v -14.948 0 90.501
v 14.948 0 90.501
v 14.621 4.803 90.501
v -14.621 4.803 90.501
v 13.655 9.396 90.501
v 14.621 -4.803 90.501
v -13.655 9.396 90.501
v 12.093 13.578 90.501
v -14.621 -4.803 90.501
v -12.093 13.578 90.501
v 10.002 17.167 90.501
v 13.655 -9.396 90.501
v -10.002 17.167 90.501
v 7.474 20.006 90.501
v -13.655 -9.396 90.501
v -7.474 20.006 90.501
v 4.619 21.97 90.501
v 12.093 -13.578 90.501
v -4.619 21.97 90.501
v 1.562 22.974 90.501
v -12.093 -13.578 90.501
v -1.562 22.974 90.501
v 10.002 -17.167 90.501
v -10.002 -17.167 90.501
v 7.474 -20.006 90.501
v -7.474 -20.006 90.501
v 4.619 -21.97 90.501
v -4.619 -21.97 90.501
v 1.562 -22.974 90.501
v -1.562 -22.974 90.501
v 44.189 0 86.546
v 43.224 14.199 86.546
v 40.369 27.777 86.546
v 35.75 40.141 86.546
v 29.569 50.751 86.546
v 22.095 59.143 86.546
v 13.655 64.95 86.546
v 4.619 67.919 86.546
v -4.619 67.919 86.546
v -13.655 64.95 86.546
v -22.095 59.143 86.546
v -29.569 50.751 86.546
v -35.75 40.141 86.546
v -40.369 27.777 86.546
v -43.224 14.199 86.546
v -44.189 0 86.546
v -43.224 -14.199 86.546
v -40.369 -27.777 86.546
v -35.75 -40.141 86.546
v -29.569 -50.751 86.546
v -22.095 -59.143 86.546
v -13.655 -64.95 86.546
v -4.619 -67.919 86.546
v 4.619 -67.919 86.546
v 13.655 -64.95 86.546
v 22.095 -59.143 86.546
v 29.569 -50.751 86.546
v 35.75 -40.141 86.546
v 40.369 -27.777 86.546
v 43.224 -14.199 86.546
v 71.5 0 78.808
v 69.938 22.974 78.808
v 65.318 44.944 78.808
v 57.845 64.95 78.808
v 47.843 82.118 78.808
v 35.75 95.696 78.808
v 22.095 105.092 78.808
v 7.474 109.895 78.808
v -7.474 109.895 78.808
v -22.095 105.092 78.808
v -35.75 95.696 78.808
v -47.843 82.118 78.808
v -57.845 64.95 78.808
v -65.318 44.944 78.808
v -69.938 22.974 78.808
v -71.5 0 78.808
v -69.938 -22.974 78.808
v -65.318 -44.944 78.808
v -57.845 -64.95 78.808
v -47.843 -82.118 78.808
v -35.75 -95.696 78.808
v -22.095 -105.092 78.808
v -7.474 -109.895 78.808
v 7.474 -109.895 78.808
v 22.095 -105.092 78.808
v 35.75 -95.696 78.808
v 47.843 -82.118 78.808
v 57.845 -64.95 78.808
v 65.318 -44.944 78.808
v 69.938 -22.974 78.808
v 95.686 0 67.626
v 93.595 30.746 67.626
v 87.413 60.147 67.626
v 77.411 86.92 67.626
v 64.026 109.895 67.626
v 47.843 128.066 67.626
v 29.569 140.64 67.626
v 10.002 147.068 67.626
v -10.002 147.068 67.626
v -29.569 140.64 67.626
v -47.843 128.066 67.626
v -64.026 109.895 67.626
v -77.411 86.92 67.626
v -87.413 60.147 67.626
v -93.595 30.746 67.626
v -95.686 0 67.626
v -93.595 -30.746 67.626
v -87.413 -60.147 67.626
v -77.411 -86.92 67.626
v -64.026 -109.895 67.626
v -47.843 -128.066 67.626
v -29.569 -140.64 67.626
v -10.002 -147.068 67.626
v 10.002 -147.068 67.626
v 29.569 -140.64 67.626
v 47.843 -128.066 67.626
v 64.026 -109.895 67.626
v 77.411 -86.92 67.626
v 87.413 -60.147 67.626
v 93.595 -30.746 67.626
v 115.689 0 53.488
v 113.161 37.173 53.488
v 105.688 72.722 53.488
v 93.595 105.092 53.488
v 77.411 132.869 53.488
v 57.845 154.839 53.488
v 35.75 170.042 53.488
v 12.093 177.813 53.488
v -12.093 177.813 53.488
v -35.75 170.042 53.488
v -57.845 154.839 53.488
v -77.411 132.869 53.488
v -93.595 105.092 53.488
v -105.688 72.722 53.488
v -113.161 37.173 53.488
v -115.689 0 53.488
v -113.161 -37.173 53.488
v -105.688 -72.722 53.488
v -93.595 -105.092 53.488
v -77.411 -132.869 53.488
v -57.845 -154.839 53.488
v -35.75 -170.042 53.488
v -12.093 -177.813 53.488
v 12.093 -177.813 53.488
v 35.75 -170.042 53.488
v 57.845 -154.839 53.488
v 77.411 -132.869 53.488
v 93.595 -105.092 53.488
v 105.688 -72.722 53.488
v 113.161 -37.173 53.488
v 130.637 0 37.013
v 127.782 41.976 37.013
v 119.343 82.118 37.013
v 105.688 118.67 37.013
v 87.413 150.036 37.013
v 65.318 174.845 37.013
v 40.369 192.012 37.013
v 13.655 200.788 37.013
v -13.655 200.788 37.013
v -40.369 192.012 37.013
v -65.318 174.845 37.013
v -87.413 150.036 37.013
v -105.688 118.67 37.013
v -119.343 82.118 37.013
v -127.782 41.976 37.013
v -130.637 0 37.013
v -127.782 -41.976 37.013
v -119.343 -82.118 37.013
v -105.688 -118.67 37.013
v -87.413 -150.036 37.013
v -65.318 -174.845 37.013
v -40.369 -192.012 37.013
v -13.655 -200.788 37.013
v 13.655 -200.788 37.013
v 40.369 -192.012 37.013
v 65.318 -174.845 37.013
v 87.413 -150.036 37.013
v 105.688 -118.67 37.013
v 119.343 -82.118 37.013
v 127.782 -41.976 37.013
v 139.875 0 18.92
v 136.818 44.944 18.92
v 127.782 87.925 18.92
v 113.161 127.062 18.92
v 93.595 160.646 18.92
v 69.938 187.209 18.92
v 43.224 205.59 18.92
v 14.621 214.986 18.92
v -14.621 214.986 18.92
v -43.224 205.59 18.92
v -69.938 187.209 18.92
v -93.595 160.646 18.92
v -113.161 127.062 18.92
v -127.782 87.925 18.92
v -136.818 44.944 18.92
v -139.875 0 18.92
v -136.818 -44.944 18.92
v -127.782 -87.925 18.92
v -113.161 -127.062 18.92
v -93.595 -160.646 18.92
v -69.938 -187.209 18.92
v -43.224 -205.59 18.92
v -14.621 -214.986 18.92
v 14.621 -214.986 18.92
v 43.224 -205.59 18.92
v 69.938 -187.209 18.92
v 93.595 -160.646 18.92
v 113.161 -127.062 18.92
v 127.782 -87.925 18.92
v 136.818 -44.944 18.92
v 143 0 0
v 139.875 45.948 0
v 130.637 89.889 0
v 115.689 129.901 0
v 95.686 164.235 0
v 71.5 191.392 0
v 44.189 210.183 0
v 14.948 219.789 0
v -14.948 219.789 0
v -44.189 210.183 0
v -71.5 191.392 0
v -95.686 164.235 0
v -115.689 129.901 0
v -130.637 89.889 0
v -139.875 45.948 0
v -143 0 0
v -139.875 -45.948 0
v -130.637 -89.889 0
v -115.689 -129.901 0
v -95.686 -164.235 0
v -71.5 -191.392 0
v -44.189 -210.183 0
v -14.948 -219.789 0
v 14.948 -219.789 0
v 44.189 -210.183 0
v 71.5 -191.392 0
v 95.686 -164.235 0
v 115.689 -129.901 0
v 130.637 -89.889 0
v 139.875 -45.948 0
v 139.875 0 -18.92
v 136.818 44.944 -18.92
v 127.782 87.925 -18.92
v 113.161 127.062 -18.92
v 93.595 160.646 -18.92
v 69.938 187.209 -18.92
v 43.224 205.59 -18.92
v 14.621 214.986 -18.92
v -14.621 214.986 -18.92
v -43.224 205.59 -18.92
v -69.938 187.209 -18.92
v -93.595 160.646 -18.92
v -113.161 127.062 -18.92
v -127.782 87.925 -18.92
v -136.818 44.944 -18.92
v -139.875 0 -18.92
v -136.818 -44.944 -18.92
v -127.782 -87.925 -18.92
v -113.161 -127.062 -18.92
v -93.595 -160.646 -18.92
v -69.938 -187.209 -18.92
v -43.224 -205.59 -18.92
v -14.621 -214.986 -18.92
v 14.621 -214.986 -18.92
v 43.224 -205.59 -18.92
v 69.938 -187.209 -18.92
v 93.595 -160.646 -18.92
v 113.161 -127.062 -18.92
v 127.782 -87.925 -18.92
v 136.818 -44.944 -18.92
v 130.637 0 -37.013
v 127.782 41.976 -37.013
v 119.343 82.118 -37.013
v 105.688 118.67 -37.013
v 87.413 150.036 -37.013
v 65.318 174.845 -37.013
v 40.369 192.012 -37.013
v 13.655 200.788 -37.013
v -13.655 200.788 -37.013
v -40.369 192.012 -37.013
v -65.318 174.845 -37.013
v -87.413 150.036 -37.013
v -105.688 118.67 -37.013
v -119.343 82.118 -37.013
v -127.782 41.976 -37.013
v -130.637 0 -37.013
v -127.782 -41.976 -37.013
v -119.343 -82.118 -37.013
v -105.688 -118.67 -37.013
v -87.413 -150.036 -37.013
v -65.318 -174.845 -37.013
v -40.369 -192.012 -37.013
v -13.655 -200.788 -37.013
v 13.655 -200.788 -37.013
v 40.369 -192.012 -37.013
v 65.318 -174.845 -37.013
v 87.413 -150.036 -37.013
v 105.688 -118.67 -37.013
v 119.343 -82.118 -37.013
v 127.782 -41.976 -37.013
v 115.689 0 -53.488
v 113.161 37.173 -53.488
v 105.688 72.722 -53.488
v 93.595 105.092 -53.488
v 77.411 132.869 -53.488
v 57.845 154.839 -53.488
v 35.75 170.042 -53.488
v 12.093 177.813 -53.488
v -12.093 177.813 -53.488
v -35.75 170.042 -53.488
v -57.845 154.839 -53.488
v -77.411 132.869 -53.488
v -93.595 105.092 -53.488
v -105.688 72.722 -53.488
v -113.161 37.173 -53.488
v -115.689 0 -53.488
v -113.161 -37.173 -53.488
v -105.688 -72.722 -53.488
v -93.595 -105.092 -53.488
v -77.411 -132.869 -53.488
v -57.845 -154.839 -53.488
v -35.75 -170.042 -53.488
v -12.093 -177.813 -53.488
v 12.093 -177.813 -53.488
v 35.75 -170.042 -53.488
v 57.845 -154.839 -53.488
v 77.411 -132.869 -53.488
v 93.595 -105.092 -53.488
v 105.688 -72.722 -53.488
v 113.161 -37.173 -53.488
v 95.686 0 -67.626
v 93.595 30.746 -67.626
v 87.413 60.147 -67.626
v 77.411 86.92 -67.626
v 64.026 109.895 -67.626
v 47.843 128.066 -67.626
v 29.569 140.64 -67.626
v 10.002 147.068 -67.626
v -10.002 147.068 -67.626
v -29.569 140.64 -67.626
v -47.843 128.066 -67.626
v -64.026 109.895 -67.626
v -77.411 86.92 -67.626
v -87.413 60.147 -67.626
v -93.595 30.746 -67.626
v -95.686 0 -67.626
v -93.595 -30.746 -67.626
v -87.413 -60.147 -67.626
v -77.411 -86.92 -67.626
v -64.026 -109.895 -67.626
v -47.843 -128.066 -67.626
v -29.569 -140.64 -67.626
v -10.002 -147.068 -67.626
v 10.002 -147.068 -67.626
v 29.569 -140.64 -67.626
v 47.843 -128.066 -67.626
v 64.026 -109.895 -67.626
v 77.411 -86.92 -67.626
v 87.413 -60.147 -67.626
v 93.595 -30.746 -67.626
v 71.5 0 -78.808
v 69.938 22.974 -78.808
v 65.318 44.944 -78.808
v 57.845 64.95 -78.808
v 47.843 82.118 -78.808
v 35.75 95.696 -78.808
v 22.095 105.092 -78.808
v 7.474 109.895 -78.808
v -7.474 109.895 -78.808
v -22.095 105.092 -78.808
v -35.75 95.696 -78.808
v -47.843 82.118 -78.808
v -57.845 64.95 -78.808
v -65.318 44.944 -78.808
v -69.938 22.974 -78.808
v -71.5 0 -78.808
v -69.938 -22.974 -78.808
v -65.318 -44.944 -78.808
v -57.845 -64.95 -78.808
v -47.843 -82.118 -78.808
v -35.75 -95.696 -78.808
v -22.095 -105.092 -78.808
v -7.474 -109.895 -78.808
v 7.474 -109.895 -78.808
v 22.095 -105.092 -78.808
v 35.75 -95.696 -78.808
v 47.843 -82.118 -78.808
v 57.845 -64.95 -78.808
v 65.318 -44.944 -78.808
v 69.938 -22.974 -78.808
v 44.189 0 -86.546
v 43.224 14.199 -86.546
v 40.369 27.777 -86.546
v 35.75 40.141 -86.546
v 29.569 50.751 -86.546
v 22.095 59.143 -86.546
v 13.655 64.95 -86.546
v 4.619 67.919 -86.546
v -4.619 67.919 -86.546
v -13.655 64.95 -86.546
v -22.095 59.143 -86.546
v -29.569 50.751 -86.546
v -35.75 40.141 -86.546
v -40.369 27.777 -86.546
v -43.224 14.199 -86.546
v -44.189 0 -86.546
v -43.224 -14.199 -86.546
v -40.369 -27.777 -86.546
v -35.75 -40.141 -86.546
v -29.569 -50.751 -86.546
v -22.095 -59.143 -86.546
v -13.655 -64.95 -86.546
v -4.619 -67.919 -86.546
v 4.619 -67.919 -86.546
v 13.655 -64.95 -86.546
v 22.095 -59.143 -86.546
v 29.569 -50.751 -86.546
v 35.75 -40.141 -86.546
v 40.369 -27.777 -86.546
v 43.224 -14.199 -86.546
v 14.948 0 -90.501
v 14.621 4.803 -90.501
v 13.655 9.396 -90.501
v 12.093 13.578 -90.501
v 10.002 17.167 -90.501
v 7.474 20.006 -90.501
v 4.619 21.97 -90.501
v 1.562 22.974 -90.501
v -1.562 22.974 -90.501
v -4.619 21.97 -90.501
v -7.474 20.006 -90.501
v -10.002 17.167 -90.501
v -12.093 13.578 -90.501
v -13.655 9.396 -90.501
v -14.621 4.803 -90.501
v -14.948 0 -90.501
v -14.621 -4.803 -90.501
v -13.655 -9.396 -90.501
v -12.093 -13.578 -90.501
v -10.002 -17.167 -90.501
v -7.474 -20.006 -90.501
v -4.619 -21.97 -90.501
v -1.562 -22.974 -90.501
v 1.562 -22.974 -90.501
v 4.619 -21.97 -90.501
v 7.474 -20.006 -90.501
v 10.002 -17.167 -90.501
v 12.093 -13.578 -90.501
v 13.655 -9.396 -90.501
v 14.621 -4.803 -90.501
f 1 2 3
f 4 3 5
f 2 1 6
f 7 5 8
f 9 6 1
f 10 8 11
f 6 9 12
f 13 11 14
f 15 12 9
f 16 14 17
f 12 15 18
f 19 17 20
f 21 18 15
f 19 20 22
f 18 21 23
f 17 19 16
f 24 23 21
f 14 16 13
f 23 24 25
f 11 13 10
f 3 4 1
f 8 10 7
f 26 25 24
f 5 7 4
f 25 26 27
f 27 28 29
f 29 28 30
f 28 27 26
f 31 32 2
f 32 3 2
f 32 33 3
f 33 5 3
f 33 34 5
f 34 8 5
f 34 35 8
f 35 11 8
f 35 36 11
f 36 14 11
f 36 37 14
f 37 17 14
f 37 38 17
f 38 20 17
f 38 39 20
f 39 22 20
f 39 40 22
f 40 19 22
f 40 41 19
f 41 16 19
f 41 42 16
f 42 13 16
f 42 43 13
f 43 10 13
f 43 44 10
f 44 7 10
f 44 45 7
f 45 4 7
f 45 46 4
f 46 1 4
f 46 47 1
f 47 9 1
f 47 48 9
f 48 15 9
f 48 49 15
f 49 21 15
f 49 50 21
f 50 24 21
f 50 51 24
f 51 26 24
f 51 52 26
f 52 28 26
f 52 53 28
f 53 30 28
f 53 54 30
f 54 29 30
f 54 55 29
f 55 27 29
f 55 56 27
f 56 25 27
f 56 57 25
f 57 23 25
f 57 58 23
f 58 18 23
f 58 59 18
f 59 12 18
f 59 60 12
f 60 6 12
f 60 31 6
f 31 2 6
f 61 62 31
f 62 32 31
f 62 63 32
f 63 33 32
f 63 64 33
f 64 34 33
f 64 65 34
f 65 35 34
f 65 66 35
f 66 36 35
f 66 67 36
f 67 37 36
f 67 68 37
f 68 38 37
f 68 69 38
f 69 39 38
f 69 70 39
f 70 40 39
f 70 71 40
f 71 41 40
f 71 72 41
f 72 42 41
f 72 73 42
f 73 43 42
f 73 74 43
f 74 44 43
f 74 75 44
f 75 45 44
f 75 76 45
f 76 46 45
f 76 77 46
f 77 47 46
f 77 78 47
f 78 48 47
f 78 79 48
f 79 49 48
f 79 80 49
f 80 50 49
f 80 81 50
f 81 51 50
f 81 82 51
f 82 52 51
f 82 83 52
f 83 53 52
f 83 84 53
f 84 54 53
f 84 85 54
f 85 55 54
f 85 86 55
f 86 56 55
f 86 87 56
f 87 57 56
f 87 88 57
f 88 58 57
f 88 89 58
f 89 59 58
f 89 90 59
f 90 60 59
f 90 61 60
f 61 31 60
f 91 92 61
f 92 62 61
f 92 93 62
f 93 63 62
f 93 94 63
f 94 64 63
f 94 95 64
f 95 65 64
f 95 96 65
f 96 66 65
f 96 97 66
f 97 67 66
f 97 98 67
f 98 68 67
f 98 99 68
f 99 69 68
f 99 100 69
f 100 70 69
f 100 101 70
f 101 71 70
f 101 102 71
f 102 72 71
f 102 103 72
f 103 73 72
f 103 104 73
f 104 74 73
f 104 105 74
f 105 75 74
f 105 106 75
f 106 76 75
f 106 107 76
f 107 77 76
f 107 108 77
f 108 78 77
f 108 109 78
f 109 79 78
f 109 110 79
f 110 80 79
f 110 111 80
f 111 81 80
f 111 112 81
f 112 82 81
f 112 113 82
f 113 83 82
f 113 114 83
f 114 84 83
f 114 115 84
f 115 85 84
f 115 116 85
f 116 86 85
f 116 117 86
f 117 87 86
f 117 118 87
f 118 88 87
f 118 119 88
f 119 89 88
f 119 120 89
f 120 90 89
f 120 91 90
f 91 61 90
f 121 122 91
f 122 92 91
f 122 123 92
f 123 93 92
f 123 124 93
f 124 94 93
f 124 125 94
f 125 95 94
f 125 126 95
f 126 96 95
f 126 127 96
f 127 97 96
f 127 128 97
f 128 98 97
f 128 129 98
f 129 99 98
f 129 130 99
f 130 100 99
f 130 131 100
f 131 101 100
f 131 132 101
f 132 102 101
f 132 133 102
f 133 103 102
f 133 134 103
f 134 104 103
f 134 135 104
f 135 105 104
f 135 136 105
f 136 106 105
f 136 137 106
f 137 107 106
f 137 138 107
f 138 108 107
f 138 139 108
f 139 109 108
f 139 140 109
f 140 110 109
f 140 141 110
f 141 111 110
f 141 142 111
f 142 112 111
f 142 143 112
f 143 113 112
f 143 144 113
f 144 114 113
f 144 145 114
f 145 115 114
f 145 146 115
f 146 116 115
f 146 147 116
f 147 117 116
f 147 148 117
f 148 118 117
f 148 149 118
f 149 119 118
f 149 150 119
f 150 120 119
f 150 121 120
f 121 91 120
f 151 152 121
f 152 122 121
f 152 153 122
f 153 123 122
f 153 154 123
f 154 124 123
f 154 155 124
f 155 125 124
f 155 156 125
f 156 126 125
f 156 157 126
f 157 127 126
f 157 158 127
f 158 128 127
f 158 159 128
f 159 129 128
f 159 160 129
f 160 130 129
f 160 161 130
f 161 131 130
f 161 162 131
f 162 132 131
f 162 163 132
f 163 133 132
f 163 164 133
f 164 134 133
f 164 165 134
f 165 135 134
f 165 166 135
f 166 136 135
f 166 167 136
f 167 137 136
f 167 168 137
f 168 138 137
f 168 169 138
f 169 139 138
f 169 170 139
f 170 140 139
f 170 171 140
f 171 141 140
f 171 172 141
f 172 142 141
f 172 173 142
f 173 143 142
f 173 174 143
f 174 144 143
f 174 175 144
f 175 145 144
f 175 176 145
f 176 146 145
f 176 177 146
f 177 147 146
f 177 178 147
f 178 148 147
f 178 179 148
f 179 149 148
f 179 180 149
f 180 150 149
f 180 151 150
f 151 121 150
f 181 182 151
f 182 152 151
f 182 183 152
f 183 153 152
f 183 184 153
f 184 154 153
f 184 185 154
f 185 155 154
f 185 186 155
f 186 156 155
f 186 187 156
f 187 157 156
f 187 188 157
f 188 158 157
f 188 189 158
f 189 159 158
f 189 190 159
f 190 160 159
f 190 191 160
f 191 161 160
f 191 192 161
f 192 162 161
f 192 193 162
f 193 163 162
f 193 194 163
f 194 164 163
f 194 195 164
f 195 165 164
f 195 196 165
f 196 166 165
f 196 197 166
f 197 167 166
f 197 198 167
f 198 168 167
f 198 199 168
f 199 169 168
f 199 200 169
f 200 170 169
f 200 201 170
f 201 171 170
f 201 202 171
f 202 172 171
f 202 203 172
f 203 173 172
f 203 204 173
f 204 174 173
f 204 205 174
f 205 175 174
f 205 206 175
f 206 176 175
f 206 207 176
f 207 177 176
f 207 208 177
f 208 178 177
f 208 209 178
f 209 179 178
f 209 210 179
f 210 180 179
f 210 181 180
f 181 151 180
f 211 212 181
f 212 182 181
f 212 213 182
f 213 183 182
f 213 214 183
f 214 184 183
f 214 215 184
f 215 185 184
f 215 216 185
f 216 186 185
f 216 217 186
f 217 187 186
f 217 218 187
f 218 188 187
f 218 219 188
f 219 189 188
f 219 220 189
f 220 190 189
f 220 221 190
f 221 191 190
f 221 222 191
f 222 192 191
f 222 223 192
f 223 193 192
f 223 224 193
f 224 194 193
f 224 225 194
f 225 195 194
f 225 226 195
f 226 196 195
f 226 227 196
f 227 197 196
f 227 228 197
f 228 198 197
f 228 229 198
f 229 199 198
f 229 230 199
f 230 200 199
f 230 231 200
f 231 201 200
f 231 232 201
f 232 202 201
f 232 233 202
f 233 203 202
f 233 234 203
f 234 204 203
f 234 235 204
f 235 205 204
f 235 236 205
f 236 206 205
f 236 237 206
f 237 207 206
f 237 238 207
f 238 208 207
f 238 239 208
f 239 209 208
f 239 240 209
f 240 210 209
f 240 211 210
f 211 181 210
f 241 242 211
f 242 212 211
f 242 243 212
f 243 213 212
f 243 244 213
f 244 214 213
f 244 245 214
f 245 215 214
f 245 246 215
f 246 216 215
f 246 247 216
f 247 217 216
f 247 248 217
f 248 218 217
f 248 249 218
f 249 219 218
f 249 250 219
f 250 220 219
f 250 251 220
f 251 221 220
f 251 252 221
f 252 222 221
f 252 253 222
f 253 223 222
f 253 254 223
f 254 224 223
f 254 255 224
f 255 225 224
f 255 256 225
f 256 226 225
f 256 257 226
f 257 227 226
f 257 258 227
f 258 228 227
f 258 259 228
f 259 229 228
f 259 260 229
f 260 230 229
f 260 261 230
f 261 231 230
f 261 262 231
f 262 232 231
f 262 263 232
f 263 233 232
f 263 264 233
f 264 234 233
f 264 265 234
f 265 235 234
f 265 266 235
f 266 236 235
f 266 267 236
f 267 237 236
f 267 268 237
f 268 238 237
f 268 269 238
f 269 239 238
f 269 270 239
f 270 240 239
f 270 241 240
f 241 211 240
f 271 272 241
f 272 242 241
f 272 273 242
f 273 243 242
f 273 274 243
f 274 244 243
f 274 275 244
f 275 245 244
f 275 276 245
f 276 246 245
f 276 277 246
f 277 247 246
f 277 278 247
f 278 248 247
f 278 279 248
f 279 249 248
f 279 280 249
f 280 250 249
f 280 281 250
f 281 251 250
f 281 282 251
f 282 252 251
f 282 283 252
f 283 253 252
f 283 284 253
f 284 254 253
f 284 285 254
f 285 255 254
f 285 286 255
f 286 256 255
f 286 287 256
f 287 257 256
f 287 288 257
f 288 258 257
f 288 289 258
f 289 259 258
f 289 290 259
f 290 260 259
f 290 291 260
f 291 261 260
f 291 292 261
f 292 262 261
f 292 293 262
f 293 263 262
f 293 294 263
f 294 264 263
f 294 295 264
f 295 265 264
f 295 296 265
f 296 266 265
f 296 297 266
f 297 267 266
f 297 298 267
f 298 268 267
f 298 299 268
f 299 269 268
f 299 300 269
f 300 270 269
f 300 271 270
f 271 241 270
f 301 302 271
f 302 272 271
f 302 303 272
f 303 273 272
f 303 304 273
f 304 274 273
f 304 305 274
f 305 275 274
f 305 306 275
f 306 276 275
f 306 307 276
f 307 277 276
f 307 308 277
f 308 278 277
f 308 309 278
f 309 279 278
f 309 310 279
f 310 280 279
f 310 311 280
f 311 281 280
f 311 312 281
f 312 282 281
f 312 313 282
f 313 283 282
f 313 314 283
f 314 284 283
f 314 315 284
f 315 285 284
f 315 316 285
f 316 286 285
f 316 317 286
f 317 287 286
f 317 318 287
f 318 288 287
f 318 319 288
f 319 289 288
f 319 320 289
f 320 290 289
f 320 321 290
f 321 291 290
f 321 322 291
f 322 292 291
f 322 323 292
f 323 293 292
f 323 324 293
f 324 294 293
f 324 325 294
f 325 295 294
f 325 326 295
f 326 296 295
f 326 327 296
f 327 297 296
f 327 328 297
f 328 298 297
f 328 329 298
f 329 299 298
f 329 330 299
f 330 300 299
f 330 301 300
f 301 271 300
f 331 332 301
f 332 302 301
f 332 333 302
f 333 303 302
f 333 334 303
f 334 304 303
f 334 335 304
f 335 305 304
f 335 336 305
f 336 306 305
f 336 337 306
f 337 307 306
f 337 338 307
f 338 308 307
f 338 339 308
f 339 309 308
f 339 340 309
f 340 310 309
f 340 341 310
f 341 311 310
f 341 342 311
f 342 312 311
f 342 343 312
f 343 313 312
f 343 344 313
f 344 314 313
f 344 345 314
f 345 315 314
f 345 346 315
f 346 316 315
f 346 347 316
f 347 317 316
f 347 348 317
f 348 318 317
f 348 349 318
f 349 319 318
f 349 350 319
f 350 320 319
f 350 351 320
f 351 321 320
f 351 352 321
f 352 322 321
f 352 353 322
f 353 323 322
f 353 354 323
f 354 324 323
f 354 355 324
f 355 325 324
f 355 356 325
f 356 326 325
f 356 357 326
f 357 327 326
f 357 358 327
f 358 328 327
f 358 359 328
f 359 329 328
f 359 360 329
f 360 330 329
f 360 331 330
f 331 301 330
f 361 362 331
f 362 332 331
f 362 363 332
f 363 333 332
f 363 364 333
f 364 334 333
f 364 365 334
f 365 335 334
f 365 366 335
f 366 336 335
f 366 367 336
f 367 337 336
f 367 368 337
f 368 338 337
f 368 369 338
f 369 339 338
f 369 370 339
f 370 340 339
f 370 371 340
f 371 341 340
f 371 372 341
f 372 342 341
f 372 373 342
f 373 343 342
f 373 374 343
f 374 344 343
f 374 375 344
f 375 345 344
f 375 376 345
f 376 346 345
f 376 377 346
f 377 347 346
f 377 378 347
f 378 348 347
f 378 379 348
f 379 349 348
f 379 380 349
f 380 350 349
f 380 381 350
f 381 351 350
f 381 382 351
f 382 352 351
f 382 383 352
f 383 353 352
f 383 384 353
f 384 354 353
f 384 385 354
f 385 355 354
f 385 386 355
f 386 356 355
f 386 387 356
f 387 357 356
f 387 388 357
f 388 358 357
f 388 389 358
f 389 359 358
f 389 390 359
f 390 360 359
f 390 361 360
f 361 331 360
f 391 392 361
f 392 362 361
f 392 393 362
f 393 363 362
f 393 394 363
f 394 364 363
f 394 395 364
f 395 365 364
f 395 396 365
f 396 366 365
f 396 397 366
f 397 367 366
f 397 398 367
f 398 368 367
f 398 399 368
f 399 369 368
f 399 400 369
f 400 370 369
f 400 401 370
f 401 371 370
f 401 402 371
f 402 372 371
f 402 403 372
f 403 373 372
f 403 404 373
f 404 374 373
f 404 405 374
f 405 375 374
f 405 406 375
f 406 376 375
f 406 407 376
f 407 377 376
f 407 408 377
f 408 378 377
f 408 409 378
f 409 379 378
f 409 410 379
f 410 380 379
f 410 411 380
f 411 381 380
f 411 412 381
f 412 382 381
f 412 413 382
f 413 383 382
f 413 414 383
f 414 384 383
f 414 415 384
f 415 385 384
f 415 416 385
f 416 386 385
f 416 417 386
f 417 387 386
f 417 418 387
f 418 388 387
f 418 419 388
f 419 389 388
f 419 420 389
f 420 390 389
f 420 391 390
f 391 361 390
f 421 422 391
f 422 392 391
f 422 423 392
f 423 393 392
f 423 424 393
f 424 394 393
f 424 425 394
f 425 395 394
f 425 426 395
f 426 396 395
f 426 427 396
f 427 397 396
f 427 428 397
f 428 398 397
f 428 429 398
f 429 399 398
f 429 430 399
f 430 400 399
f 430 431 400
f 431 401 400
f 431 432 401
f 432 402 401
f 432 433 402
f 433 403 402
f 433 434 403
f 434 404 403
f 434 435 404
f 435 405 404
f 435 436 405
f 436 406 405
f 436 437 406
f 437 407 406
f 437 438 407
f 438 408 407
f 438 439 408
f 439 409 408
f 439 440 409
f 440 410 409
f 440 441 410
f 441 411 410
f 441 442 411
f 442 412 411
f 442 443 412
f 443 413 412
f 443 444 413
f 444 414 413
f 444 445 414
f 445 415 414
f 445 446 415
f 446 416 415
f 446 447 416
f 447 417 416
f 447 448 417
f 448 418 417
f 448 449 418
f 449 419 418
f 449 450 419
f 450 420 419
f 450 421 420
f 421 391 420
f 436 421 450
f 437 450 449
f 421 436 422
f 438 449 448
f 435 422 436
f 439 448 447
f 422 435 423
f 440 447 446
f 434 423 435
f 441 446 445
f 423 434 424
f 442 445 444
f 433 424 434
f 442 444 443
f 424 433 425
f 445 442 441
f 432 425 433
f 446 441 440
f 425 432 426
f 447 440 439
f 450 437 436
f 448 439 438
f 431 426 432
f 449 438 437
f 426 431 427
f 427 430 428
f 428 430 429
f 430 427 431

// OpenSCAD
// Generated by SolidPython 1.0.1 on 2020-07-29 00:46:50


scale(v = [11, 17, 7]) {
	sphere(r = 13);
}
/***********************************************
*********      SolidPython code:      **********
************************************************
 
# import packages: SolidPython
from solid import *
from solid.utils import *
from itertools import chain, combinations, permutations


class Resize:

    def __init__(self, scad_file):
        self.scad_file = scad_file
        #self.scad_file = import_scad(scad_file)
        # cone/cylinder param:
        self.r1 = 0
        self.r2 = 0
        self.h = 0
        # rectangular prism param:
        self.w = 0
        self.l = 0
        # ellipse param:
        self.r = 0

    # import OpenScad code (file name corresponds to shape)


    # classify shape + parameters
    def assign(self, param1, param2, param3):
        if self.scad_file == 'cone.scad':
            self.r1 = param1
            self.r2 = param2
            self.h = param3
        elif self.scad_file == 'cylinder.scad':
            self.r1 = param1
            self.r2 = param2
            self.h = param3
        elif self.scad_file == 'rectangularPrism.scad':
            self.h = param1
            self.l = param2
            self.w = param3
        else:
            self.r = param1
            self.h = param2

    # resize parameters
    def iterate(self):
        x = range(3, 20, 2)
        i = 1
        if self.scad_file == 'cone.scad':
            tempList = list(permutations(x, 2))
            for temp in tempList:
                param1 = temp[0]
                param2 = temp[1]
                filepath = 'produced_scad_files/' + 'cone' + str(param1) + '_' + str(param2) + '_' + '.scad'
                scad_render_to_file(cylinder(h=param1, r1=param2, r2=0), filepath)

        elif self.scad_file == 'cylinder.scad':
            tempList = list(permutations(x, 3))
            for temp in tempList:
                param1 = temp[0]
                param2 = temp[1]
                filepath = 'produced_scad_files/' + 'cylinder' + str(param1) + '_' + str(param2) + '_' + '.scad'
                scad_render_to_file(cylinder(h=param1, r1=param2, r2=param2), filepath)

        elif self.scad_file == 'rectangularPrism.scad':
            tempList = list(permutations(x, 3))
            for temp in tempList:
                param1 = temp[0]
                param2 = temp[1]
                param3 = temp[2]
                filepath = 'produced_scad_files/' + 'rectangularPrism' + str(param1) + '_' + str(param2) + '_' + str(
                    param3) + '.scad'
                scad_render_to_file(cube(size=(param1, param2, param3)), filepath)

        elif self.scad_file == 'ellipse.scad':
            tempList = list(permutations(x, 4))
            for temp in tempList:
                param1 = temp[0]
                param2 = temp[1]
                param3 = temp[2]
                param4 = temp[3]
                filepath = 'produced_scad_files/' + 'ellipse' + str(param1) + '_' + str(param2) + '_' + str(param3) + '_' + str(param4) + '.scad'
                scad_render_to_file(scale([param1, param2, param3])(sphere(r=param4)), filepath)

    def render_to_scadfile(self):
        scad_render_to_file(scad, 'example.scad') 
 
************************************************/
